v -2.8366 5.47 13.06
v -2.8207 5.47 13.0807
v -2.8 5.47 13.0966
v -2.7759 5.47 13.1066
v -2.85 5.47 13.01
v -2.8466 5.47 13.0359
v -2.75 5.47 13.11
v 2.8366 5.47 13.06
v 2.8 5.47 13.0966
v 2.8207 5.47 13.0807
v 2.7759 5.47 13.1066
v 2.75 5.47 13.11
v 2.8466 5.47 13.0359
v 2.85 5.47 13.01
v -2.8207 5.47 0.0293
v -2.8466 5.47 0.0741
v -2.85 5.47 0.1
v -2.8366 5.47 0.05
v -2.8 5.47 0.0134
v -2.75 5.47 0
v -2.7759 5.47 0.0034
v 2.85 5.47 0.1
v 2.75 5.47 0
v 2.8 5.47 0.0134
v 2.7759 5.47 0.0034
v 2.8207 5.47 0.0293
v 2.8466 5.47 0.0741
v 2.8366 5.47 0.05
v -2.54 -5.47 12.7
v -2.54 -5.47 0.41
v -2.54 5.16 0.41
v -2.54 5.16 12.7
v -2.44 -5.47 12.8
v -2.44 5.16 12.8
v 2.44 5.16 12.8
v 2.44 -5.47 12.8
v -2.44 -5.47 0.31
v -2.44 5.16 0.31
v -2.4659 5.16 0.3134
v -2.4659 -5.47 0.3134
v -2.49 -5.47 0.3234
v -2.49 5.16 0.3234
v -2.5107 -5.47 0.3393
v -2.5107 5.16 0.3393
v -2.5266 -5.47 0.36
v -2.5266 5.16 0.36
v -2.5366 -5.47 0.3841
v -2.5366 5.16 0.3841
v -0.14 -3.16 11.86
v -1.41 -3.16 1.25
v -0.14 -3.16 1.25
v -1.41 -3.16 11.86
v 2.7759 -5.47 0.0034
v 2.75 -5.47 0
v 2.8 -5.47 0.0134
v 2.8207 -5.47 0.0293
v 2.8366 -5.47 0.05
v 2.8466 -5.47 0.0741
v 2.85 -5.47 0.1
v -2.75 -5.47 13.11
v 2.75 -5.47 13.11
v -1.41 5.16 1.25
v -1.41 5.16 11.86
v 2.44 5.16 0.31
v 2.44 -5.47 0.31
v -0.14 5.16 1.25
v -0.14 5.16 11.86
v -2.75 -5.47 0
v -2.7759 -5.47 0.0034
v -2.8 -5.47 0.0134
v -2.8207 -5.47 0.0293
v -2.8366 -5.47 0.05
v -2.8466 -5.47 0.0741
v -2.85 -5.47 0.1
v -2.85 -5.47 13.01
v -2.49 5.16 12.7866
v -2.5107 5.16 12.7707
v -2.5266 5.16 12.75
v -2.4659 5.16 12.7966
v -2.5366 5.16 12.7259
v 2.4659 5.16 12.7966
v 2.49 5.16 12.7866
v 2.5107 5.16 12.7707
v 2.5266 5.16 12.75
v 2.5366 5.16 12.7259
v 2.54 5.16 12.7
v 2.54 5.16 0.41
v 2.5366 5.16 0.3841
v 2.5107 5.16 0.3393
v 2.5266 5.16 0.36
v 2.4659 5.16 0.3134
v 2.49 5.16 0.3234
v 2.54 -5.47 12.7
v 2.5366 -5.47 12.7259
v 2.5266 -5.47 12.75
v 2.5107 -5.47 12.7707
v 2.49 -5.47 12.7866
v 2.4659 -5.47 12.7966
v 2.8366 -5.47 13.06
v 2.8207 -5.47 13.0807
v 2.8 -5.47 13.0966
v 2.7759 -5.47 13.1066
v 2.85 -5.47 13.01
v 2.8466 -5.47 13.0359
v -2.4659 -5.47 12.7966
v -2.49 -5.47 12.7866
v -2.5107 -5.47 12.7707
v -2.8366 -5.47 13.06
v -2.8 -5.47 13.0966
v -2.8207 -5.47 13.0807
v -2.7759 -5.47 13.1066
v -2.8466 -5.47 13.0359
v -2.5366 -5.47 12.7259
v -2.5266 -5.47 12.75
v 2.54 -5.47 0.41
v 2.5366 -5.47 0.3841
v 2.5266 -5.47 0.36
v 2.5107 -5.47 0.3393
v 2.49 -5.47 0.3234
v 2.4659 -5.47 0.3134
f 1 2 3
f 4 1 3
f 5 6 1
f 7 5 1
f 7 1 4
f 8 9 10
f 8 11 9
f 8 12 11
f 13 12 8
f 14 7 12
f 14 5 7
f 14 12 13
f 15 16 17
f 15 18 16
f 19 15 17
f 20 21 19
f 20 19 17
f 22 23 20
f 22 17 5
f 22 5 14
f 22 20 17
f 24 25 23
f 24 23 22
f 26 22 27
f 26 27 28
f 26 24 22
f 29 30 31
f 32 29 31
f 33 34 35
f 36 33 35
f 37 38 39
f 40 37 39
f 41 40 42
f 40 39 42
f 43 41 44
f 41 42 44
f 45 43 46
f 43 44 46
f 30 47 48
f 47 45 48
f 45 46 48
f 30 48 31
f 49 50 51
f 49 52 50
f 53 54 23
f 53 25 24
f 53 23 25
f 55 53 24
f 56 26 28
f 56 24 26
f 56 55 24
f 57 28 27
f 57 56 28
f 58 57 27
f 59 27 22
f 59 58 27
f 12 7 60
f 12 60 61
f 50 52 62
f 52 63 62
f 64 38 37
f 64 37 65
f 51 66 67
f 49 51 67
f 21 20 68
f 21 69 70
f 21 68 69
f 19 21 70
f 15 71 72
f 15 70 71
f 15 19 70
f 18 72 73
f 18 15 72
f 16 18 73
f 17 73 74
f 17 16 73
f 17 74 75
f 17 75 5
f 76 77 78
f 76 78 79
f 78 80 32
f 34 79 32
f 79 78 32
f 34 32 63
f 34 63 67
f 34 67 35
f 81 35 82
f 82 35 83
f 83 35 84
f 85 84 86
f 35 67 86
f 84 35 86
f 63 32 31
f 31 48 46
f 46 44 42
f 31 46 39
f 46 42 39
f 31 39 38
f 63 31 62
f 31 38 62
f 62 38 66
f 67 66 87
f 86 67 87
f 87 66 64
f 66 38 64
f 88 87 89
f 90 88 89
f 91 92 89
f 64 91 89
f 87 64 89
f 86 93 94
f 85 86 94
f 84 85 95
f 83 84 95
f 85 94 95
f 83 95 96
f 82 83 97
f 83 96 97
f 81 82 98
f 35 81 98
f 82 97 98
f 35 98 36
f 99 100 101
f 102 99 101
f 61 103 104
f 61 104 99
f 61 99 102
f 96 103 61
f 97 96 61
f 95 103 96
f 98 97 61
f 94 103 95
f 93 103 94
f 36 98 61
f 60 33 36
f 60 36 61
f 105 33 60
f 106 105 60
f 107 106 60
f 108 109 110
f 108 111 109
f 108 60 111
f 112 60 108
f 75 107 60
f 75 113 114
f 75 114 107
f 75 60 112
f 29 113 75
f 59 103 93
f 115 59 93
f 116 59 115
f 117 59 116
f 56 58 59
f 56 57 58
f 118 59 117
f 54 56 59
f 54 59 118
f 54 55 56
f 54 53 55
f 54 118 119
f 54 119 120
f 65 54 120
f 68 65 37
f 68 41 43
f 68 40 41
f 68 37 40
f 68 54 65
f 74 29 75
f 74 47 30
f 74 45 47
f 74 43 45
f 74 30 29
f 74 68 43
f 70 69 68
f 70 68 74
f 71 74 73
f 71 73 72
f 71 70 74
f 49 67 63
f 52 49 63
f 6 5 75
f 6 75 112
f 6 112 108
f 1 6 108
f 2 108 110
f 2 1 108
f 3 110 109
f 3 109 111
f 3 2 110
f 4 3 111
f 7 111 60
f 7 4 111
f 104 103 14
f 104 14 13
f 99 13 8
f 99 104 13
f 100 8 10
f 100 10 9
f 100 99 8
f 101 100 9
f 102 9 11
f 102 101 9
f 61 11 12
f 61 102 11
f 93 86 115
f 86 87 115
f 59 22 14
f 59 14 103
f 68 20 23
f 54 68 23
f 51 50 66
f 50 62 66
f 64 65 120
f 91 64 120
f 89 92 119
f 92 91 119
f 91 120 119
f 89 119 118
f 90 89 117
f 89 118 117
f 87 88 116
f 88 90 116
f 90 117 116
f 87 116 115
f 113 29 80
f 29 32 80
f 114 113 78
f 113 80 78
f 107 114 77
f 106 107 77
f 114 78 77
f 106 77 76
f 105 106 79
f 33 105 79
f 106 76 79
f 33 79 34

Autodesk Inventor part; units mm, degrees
ref_plane "YZ Plane" through (0, 0, 0) normal (1, 0, 0) x (0, 1, 0)
ref_plane "XZ Plane" through (0, 0, 0) normal (0, 1, 0) x (-1, 0, 0)
ref_plane "XY Plane" through (0, 0, 0) normal (0, 0, 1) x (1, 0, 0)
sketch "Skizze1" plane through (0, 0, 0) normal (0, 0, 1) x (1, 0, 0)
  line L0 (-2.85, 5.47) -> (2.85, 5.47)
  line L1 (2.85, 5.47) -> (2.85, -5.47)
  line L2 (2.85, -5.47) -> (-2.85, -5.47)
  line L3 (-2.85, -5.47) -> (-2.85, 5.47)
  line L4 (-2.85, 5.47) -> (2.85, -5.47) construction
  point P0 (0, 0)
  point P1 (0, 0)
  dimension "d0" = 5.7
  dimension "d1" = 10.94
extrude "Extrusion1" add sketch "Skizze1" along normal blind 13.11
shell "Wandung1" thickness 0.31 removed faces 1 at (0.95, -5.47, 4.37)
fillet "Rundung1" radius 0.1 8 edges at (2.85, 0, 13.11) (-2.85, 0, 13.11) (2.85, 0, 0) (-2.85, 0, 0) (2.54, -0.155, 12.8) (-2.54, -0.155, 12.8) (-2.54, -0.155, 0.31) (2.54, -0.155, 0.31)
sketch "Skizze2" plane through (-2.44, 5.16, 12.8) normal (0, -1, 0) x (1, 0, 0)
  arc A0 (4.88, -12.49) -> (4.98, -12.39) centre (4.88, -12.39) ccw construction
  line L0 (4.88, -12.39) -> (2.3, -12.39) construction
  line L1 (2.3, -12.39) -> (2.3, -11.55) construction
  line L2 (2.3, -11.55) -> (4.88, -11.55) construction
  line L3 (4.88, -11.55) -> (4.88, -12.39) construction
  arc A1 (4.98, -0.1) -> (4.88, 0) centre (4.88, -0.1) ccw construction
  line L4 (4.88, -0.1) -> (2.3, -0.1) construction
  line L5 (2.3, -0.1) -> (2.3, -0.94) construction
  line L6 (2.3, -0.94) -> (4.88, -0.94) construction
  line L7 (4.88, -0.94) -> (4.88, -0.1) construction
  line L8 (-0.1, -12.39) -> (-0.1, -0.1) construction
  line L9 (-0.1, -6.245) -> (1.03, -6.245) construction
  line L10 (2.3, -0.94) -> (1.03, -0.94)
  line L11 (1.03, -0.94) -> (1.03, -11.55)
  line L12 (1.03, -11.55) -> (2.3, -11.55)
  line L13 (2.3, -11.55) -> (2.3, -0.94)
  point P0 (2.44, -12.8)
  dimension "d6" = 2.58
  dimension "d7" = 0.84
  dimension "d8" = 2.58
  dimension "d9" = 0.84
  dimension "d10" = 1.13
extrude "Extrusion2" add sketch "Skizze2" along normal blind 8.32
properties part number "USBstick_halter"
